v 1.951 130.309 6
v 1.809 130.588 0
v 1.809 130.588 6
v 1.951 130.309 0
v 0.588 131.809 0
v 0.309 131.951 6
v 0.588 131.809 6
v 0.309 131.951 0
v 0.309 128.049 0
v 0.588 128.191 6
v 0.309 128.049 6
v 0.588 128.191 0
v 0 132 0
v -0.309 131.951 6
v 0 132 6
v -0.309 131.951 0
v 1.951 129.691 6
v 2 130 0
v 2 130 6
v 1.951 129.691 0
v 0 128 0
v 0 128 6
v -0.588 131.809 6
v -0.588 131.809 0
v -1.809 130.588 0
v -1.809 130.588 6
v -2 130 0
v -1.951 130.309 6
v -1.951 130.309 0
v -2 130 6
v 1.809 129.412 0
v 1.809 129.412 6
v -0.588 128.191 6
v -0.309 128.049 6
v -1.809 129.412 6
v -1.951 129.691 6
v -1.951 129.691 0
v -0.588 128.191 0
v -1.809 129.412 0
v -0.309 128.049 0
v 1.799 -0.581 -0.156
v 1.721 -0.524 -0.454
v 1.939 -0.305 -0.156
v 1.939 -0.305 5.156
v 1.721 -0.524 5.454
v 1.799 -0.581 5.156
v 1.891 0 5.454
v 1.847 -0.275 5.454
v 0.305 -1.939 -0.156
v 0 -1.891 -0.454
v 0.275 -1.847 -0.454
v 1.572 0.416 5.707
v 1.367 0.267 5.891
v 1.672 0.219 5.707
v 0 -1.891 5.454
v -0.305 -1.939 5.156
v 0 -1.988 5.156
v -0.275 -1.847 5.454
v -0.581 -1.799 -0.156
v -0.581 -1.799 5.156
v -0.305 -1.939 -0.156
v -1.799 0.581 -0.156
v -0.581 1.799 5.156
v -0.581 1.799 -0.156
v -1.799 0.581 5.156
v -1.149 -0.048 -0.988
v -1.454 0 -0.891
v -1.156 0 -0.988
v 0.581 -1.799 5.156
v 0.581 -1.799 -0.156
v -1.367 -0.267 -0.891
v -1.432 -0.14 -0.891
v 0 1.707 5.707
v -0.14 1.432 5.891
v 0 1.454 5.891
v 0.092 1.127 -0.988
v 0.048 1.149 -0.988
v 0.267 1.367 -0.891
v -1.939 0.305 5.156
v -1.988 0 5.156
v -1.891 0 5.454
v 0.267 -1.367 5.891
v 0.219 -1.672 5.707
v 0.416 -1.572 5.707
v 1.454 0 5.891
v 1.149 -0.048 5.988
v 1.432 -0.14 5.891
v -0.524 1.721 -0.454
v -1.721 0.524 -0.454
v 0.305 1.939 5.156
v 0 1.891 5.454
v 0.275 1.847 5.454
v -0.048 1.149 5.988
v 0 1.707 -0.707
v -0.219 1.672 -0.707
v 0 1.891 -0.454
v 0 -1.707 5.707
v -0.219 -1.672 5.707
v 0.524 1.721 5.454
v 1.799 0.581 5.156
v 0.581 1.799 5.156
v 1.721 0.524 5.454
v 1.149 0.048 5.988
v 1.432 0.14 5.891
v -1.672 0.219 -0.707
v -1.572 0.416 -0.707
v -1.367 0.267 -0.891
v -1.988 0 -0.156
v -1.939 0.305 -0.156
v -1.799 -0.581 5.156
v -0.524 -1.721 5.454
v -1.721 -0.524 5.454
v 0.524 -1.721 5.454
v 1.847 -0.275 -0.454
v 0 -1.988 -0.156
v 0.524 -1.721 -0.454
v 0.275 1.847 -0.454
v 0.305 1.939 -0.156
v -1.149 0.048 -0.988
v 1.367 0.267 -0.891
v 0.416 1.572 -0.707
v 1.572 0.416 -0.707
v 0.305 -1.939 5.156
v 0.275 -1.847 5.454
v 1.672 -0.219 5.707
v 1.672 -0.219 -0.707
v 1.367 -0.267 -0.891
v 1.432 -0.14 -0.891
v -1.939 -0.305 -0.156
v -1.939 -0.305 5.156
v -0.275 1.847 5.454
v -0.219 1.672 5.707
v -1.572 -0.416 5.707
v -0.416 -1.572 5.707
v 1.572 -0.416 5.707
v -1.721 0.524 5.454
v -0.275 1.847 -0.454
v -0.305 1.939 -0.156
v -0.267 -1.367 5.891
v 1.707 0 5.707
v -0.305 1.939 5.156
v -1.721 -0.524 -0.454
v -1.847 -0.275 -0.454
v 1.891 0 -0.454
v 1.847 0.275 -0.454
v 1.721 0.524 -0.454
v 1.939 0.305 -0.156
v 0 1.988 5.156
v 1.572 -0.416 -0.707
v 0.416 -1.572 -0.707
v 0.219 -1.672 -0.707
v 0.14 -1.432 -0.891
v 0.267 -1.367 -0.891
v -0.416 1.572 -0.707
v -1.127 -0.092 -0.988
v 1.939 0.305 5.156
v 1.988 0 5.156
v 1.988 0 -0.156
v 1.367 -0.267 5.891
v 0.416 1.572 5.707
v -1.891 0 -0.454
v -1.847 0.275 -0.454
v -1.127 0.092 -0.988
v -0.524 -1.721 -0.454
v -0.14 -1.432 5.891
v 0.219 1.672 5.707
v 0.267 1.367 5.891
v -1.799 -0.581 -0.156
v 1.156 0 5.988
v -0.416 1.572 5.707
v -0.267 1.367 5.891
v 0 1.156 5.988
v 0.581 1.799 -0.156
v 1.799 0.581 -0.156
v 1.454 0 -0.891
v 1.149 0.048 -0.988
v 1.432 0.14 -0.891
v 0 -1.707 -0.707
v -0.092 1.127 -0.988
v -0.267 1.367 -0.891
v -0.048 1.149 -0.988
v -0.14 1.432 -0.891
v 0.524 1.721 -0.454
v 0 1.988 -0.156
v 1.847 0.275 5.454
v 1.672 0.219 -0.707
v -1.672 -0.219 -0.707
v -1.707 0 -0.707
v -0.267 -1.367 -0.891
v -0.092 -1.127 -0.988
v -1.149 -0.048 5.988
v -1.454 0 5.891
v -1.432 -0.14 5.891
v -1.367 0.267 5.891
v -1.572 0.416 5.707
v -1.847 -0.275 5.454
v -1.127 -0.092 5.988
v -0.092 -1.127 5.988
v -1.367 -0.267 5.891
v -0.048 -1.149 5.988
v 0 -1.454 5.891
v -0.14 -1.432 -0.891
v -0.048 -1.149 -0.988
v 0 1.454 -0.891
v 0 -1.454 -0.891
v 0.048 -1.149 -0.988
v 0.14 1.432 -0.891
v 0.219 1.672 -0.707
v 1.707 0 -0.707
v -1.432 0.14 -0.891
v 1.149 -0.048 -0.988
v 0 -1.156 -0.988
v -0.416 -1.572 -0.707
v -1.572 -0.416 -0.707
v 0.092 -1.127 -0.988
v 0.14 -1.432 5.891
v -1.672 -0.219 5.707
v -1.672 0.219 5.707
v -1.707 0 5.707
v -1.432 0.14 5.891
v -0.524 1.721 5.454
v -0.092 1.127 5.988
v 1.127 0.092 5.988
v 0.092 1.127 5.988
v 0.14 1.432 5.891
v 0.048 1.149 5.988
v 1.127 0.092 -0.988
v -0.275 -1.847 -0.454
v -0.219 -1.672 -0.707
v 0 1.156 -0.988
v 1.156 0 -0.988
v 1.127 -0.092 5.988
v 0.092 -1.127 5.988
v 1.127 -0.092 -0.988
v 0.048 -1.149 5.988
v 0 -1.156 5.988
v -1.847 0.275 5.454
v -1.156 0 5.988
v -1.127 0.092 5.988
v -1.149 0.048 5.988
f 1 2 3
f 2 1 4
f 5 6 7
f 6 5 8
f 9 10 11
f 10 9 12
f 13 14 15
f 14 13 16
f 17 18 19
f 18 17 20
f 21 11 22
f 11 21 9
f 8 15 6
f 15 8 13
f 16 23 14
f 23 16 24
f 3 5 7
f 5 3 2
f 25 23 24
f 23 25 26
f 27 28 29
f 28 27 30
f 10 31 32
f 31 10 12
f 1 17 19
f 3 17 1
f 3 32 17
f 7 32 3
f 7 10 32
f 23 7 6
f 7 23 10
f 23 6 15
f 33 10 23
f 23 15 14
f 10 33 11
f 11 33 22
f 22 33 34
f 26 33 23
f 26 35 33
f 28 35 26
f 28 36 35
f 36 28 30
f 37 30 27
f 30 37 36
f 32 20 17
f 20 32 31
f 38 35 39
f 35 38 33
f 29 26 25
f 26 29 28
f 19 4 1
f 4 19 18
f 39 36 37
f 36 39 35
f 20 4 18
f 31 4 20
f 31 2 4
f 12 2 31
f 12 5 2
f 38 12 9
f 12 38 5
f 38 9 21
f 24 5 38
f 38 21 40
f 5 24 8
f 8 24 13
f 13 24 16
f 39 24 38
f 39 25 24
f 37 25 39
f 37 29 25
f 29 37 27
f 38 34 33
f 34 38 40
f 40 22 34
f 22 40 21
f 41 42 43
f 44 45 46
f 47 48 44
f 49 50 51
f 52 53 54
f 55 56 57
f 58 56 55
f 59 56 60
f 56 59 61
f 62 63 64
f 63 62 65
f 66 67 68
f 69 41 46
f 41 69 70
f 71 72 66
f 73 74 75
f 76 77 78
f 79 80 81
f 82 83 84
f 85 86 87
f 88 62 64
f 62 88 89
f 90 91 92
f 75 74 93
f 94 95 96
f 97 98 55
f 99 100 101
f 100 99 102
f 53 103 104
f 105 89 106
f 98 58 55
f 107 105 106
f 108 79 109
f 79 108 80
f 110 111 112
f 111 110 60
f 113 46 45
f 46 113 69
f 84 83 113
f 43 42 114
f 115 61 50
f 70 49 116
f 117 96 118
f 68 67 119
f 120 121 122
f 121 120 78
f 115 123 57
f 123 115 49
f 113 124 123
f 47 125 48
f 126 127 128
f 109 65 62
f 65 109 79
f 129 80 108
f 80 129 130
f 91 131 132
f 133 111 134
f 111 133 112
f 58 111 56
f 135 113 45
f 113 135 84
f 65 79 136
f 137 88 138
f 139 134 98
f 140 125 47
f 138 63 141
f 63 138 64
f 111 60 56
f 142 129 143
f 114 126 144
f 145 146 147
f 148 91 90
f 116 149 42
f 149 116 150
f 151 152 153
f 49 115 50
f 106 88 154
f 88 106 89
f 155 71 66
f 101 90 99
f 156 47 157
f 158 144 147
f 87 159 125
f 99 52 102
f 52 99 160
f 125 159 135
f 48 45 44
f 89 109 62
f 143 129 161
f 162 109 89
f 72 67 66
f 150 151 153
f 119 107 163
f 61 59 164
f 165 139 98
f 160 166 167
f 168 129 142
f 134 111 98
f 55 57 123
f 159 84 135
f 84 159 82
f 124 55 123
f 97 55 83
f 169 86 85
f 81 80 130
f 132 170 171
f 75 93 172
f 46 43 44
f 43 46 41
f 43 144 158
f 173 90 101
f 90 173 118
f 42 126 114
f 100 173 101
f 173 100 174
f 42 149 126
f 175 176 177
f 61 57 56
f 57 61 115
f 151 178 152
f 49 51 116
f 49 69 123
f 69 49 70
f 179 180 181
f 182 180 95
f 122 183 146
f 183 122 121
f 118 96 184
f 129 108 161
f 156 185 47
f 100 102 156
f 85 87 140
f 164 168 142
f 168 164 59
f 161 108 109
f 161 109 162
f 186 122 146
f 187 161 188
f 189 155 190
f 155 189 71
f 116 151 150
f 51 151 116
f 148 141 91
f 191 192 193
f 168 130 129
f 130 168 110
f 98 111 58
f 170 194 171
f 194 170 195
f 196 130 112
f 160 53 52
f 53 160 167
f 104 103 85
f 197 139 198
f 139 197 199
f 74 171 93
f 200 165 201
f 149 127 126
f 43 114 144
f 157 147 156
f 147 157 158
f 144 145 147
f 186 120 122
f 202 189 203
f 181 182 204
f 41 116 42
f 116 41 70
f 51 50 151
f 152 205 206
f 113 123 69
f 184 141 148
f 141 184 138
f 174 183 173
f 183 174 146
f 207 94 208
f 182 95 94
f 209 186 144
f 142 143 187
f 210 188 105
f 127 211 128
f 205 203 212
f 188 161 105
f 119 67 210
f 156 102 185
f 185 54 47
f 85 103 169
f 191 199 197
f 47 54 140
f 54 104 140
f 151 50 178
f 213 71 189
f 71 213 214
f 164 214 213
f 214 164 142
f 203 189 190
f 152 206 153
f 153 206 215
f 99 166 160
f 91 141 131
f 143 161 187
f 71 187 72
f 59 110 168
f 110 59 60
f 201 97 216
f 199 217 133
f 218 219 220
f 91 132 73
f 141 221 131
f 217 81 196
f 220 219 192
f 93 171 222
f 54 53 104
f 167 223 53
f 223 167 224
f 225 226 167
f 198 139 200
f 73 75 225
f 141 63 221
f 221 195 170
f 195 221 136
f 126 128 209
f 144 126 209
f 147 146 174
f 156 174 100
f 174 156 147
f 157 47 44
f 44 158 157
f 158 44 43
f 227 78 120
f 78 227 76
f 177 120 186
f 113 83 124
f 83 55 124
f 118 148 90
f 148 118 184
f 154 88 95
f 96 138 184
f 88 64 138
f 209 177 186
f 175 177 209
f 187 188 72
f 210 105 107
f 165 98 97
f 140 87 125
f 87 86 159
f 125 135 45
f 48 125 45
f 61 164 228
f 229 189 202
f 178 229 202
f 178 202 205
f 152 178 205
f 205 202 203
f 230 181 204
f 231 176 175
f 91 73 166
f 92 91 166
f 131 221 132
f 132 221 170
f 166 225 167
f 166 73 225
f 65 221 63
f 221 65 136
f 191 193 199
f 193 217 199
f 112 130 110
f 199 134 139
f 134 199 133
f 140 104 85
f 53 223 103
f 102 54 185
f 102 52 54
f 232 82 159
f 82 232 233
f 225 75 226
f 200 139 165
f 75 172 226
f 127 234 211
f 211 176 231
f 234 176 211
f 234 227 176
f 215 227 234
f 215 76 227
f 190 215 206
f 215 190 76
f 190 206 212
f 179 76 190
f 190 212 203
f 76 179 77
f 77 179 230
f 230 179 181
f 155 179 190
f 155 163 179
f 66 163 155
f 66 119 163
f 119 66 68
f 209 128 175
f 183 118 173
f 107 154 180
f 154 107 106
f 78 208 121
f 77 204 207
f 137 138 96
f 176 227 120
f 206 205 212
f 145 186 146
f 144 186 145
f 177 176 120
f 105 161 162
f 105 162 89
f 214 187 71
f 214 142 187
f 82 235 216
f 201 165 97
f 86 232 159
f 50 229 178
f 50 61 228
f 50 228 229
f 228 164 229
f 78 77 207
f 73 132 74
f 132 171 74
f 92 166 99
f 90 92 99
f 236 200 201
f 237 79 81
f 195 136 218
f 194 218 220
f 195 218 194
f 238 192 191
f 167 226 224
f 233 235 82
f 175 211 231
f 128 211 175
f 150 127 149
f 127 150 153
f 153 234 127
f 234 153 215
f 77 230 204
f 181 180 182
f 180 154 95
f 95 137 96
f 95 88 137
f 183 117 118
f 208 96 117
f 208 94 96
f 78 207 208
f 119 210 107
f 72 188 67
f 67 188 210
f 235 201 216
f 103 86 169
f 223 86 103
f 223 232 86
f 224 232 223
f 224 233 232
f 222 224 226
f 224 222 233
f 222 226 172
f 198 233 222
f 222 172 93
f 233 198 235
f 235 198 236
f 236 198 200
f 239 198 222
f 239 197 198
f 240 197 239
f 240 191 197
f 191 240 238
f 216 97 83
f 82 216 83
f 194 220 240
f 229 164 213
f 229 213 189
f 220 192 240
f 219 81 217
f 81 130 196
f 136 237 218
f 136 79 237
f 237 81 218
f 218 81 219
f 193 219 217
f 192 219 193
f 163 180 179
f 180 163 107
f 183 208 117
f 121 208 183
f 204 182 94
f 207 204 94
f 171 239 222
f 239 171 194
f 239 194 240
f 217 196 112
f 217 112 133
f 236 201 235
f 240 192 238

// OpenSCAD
// file: rounded-pyramid.scad
/**
 * 
 */
module roundedPyramid(h, r1, r2, cornerRadius, sides=30, sidesOnly=false)
//module roundedPyramid(size, cornerRadius, sides=30, sidesOnly=false)
{
	$fn=sides;
	
	minkowski()//size, cornerRadius)
	{
		cylinder(h=h, r1=r1, r2=r2, $fn=4);
	    
	    if(sidesOnly)
	    {
	    	cylinder(r=cornerRadius);
	    }
	    else
	    {
	    	sphere(r=cornerRadius);
	    	
    	}
	}	
}
// main file
use <rounded-pyramid.scad>

// this one is shaped like a desktop keyboard keycap.
color("grey")
translate([0, 130, 0])
roundedPyramid(5, sides=20, sidesOnly=true);

// this one has rounded a top/bottom as well as rounded sides.
color("orange")
roundedPyramid(5, sides=20);
